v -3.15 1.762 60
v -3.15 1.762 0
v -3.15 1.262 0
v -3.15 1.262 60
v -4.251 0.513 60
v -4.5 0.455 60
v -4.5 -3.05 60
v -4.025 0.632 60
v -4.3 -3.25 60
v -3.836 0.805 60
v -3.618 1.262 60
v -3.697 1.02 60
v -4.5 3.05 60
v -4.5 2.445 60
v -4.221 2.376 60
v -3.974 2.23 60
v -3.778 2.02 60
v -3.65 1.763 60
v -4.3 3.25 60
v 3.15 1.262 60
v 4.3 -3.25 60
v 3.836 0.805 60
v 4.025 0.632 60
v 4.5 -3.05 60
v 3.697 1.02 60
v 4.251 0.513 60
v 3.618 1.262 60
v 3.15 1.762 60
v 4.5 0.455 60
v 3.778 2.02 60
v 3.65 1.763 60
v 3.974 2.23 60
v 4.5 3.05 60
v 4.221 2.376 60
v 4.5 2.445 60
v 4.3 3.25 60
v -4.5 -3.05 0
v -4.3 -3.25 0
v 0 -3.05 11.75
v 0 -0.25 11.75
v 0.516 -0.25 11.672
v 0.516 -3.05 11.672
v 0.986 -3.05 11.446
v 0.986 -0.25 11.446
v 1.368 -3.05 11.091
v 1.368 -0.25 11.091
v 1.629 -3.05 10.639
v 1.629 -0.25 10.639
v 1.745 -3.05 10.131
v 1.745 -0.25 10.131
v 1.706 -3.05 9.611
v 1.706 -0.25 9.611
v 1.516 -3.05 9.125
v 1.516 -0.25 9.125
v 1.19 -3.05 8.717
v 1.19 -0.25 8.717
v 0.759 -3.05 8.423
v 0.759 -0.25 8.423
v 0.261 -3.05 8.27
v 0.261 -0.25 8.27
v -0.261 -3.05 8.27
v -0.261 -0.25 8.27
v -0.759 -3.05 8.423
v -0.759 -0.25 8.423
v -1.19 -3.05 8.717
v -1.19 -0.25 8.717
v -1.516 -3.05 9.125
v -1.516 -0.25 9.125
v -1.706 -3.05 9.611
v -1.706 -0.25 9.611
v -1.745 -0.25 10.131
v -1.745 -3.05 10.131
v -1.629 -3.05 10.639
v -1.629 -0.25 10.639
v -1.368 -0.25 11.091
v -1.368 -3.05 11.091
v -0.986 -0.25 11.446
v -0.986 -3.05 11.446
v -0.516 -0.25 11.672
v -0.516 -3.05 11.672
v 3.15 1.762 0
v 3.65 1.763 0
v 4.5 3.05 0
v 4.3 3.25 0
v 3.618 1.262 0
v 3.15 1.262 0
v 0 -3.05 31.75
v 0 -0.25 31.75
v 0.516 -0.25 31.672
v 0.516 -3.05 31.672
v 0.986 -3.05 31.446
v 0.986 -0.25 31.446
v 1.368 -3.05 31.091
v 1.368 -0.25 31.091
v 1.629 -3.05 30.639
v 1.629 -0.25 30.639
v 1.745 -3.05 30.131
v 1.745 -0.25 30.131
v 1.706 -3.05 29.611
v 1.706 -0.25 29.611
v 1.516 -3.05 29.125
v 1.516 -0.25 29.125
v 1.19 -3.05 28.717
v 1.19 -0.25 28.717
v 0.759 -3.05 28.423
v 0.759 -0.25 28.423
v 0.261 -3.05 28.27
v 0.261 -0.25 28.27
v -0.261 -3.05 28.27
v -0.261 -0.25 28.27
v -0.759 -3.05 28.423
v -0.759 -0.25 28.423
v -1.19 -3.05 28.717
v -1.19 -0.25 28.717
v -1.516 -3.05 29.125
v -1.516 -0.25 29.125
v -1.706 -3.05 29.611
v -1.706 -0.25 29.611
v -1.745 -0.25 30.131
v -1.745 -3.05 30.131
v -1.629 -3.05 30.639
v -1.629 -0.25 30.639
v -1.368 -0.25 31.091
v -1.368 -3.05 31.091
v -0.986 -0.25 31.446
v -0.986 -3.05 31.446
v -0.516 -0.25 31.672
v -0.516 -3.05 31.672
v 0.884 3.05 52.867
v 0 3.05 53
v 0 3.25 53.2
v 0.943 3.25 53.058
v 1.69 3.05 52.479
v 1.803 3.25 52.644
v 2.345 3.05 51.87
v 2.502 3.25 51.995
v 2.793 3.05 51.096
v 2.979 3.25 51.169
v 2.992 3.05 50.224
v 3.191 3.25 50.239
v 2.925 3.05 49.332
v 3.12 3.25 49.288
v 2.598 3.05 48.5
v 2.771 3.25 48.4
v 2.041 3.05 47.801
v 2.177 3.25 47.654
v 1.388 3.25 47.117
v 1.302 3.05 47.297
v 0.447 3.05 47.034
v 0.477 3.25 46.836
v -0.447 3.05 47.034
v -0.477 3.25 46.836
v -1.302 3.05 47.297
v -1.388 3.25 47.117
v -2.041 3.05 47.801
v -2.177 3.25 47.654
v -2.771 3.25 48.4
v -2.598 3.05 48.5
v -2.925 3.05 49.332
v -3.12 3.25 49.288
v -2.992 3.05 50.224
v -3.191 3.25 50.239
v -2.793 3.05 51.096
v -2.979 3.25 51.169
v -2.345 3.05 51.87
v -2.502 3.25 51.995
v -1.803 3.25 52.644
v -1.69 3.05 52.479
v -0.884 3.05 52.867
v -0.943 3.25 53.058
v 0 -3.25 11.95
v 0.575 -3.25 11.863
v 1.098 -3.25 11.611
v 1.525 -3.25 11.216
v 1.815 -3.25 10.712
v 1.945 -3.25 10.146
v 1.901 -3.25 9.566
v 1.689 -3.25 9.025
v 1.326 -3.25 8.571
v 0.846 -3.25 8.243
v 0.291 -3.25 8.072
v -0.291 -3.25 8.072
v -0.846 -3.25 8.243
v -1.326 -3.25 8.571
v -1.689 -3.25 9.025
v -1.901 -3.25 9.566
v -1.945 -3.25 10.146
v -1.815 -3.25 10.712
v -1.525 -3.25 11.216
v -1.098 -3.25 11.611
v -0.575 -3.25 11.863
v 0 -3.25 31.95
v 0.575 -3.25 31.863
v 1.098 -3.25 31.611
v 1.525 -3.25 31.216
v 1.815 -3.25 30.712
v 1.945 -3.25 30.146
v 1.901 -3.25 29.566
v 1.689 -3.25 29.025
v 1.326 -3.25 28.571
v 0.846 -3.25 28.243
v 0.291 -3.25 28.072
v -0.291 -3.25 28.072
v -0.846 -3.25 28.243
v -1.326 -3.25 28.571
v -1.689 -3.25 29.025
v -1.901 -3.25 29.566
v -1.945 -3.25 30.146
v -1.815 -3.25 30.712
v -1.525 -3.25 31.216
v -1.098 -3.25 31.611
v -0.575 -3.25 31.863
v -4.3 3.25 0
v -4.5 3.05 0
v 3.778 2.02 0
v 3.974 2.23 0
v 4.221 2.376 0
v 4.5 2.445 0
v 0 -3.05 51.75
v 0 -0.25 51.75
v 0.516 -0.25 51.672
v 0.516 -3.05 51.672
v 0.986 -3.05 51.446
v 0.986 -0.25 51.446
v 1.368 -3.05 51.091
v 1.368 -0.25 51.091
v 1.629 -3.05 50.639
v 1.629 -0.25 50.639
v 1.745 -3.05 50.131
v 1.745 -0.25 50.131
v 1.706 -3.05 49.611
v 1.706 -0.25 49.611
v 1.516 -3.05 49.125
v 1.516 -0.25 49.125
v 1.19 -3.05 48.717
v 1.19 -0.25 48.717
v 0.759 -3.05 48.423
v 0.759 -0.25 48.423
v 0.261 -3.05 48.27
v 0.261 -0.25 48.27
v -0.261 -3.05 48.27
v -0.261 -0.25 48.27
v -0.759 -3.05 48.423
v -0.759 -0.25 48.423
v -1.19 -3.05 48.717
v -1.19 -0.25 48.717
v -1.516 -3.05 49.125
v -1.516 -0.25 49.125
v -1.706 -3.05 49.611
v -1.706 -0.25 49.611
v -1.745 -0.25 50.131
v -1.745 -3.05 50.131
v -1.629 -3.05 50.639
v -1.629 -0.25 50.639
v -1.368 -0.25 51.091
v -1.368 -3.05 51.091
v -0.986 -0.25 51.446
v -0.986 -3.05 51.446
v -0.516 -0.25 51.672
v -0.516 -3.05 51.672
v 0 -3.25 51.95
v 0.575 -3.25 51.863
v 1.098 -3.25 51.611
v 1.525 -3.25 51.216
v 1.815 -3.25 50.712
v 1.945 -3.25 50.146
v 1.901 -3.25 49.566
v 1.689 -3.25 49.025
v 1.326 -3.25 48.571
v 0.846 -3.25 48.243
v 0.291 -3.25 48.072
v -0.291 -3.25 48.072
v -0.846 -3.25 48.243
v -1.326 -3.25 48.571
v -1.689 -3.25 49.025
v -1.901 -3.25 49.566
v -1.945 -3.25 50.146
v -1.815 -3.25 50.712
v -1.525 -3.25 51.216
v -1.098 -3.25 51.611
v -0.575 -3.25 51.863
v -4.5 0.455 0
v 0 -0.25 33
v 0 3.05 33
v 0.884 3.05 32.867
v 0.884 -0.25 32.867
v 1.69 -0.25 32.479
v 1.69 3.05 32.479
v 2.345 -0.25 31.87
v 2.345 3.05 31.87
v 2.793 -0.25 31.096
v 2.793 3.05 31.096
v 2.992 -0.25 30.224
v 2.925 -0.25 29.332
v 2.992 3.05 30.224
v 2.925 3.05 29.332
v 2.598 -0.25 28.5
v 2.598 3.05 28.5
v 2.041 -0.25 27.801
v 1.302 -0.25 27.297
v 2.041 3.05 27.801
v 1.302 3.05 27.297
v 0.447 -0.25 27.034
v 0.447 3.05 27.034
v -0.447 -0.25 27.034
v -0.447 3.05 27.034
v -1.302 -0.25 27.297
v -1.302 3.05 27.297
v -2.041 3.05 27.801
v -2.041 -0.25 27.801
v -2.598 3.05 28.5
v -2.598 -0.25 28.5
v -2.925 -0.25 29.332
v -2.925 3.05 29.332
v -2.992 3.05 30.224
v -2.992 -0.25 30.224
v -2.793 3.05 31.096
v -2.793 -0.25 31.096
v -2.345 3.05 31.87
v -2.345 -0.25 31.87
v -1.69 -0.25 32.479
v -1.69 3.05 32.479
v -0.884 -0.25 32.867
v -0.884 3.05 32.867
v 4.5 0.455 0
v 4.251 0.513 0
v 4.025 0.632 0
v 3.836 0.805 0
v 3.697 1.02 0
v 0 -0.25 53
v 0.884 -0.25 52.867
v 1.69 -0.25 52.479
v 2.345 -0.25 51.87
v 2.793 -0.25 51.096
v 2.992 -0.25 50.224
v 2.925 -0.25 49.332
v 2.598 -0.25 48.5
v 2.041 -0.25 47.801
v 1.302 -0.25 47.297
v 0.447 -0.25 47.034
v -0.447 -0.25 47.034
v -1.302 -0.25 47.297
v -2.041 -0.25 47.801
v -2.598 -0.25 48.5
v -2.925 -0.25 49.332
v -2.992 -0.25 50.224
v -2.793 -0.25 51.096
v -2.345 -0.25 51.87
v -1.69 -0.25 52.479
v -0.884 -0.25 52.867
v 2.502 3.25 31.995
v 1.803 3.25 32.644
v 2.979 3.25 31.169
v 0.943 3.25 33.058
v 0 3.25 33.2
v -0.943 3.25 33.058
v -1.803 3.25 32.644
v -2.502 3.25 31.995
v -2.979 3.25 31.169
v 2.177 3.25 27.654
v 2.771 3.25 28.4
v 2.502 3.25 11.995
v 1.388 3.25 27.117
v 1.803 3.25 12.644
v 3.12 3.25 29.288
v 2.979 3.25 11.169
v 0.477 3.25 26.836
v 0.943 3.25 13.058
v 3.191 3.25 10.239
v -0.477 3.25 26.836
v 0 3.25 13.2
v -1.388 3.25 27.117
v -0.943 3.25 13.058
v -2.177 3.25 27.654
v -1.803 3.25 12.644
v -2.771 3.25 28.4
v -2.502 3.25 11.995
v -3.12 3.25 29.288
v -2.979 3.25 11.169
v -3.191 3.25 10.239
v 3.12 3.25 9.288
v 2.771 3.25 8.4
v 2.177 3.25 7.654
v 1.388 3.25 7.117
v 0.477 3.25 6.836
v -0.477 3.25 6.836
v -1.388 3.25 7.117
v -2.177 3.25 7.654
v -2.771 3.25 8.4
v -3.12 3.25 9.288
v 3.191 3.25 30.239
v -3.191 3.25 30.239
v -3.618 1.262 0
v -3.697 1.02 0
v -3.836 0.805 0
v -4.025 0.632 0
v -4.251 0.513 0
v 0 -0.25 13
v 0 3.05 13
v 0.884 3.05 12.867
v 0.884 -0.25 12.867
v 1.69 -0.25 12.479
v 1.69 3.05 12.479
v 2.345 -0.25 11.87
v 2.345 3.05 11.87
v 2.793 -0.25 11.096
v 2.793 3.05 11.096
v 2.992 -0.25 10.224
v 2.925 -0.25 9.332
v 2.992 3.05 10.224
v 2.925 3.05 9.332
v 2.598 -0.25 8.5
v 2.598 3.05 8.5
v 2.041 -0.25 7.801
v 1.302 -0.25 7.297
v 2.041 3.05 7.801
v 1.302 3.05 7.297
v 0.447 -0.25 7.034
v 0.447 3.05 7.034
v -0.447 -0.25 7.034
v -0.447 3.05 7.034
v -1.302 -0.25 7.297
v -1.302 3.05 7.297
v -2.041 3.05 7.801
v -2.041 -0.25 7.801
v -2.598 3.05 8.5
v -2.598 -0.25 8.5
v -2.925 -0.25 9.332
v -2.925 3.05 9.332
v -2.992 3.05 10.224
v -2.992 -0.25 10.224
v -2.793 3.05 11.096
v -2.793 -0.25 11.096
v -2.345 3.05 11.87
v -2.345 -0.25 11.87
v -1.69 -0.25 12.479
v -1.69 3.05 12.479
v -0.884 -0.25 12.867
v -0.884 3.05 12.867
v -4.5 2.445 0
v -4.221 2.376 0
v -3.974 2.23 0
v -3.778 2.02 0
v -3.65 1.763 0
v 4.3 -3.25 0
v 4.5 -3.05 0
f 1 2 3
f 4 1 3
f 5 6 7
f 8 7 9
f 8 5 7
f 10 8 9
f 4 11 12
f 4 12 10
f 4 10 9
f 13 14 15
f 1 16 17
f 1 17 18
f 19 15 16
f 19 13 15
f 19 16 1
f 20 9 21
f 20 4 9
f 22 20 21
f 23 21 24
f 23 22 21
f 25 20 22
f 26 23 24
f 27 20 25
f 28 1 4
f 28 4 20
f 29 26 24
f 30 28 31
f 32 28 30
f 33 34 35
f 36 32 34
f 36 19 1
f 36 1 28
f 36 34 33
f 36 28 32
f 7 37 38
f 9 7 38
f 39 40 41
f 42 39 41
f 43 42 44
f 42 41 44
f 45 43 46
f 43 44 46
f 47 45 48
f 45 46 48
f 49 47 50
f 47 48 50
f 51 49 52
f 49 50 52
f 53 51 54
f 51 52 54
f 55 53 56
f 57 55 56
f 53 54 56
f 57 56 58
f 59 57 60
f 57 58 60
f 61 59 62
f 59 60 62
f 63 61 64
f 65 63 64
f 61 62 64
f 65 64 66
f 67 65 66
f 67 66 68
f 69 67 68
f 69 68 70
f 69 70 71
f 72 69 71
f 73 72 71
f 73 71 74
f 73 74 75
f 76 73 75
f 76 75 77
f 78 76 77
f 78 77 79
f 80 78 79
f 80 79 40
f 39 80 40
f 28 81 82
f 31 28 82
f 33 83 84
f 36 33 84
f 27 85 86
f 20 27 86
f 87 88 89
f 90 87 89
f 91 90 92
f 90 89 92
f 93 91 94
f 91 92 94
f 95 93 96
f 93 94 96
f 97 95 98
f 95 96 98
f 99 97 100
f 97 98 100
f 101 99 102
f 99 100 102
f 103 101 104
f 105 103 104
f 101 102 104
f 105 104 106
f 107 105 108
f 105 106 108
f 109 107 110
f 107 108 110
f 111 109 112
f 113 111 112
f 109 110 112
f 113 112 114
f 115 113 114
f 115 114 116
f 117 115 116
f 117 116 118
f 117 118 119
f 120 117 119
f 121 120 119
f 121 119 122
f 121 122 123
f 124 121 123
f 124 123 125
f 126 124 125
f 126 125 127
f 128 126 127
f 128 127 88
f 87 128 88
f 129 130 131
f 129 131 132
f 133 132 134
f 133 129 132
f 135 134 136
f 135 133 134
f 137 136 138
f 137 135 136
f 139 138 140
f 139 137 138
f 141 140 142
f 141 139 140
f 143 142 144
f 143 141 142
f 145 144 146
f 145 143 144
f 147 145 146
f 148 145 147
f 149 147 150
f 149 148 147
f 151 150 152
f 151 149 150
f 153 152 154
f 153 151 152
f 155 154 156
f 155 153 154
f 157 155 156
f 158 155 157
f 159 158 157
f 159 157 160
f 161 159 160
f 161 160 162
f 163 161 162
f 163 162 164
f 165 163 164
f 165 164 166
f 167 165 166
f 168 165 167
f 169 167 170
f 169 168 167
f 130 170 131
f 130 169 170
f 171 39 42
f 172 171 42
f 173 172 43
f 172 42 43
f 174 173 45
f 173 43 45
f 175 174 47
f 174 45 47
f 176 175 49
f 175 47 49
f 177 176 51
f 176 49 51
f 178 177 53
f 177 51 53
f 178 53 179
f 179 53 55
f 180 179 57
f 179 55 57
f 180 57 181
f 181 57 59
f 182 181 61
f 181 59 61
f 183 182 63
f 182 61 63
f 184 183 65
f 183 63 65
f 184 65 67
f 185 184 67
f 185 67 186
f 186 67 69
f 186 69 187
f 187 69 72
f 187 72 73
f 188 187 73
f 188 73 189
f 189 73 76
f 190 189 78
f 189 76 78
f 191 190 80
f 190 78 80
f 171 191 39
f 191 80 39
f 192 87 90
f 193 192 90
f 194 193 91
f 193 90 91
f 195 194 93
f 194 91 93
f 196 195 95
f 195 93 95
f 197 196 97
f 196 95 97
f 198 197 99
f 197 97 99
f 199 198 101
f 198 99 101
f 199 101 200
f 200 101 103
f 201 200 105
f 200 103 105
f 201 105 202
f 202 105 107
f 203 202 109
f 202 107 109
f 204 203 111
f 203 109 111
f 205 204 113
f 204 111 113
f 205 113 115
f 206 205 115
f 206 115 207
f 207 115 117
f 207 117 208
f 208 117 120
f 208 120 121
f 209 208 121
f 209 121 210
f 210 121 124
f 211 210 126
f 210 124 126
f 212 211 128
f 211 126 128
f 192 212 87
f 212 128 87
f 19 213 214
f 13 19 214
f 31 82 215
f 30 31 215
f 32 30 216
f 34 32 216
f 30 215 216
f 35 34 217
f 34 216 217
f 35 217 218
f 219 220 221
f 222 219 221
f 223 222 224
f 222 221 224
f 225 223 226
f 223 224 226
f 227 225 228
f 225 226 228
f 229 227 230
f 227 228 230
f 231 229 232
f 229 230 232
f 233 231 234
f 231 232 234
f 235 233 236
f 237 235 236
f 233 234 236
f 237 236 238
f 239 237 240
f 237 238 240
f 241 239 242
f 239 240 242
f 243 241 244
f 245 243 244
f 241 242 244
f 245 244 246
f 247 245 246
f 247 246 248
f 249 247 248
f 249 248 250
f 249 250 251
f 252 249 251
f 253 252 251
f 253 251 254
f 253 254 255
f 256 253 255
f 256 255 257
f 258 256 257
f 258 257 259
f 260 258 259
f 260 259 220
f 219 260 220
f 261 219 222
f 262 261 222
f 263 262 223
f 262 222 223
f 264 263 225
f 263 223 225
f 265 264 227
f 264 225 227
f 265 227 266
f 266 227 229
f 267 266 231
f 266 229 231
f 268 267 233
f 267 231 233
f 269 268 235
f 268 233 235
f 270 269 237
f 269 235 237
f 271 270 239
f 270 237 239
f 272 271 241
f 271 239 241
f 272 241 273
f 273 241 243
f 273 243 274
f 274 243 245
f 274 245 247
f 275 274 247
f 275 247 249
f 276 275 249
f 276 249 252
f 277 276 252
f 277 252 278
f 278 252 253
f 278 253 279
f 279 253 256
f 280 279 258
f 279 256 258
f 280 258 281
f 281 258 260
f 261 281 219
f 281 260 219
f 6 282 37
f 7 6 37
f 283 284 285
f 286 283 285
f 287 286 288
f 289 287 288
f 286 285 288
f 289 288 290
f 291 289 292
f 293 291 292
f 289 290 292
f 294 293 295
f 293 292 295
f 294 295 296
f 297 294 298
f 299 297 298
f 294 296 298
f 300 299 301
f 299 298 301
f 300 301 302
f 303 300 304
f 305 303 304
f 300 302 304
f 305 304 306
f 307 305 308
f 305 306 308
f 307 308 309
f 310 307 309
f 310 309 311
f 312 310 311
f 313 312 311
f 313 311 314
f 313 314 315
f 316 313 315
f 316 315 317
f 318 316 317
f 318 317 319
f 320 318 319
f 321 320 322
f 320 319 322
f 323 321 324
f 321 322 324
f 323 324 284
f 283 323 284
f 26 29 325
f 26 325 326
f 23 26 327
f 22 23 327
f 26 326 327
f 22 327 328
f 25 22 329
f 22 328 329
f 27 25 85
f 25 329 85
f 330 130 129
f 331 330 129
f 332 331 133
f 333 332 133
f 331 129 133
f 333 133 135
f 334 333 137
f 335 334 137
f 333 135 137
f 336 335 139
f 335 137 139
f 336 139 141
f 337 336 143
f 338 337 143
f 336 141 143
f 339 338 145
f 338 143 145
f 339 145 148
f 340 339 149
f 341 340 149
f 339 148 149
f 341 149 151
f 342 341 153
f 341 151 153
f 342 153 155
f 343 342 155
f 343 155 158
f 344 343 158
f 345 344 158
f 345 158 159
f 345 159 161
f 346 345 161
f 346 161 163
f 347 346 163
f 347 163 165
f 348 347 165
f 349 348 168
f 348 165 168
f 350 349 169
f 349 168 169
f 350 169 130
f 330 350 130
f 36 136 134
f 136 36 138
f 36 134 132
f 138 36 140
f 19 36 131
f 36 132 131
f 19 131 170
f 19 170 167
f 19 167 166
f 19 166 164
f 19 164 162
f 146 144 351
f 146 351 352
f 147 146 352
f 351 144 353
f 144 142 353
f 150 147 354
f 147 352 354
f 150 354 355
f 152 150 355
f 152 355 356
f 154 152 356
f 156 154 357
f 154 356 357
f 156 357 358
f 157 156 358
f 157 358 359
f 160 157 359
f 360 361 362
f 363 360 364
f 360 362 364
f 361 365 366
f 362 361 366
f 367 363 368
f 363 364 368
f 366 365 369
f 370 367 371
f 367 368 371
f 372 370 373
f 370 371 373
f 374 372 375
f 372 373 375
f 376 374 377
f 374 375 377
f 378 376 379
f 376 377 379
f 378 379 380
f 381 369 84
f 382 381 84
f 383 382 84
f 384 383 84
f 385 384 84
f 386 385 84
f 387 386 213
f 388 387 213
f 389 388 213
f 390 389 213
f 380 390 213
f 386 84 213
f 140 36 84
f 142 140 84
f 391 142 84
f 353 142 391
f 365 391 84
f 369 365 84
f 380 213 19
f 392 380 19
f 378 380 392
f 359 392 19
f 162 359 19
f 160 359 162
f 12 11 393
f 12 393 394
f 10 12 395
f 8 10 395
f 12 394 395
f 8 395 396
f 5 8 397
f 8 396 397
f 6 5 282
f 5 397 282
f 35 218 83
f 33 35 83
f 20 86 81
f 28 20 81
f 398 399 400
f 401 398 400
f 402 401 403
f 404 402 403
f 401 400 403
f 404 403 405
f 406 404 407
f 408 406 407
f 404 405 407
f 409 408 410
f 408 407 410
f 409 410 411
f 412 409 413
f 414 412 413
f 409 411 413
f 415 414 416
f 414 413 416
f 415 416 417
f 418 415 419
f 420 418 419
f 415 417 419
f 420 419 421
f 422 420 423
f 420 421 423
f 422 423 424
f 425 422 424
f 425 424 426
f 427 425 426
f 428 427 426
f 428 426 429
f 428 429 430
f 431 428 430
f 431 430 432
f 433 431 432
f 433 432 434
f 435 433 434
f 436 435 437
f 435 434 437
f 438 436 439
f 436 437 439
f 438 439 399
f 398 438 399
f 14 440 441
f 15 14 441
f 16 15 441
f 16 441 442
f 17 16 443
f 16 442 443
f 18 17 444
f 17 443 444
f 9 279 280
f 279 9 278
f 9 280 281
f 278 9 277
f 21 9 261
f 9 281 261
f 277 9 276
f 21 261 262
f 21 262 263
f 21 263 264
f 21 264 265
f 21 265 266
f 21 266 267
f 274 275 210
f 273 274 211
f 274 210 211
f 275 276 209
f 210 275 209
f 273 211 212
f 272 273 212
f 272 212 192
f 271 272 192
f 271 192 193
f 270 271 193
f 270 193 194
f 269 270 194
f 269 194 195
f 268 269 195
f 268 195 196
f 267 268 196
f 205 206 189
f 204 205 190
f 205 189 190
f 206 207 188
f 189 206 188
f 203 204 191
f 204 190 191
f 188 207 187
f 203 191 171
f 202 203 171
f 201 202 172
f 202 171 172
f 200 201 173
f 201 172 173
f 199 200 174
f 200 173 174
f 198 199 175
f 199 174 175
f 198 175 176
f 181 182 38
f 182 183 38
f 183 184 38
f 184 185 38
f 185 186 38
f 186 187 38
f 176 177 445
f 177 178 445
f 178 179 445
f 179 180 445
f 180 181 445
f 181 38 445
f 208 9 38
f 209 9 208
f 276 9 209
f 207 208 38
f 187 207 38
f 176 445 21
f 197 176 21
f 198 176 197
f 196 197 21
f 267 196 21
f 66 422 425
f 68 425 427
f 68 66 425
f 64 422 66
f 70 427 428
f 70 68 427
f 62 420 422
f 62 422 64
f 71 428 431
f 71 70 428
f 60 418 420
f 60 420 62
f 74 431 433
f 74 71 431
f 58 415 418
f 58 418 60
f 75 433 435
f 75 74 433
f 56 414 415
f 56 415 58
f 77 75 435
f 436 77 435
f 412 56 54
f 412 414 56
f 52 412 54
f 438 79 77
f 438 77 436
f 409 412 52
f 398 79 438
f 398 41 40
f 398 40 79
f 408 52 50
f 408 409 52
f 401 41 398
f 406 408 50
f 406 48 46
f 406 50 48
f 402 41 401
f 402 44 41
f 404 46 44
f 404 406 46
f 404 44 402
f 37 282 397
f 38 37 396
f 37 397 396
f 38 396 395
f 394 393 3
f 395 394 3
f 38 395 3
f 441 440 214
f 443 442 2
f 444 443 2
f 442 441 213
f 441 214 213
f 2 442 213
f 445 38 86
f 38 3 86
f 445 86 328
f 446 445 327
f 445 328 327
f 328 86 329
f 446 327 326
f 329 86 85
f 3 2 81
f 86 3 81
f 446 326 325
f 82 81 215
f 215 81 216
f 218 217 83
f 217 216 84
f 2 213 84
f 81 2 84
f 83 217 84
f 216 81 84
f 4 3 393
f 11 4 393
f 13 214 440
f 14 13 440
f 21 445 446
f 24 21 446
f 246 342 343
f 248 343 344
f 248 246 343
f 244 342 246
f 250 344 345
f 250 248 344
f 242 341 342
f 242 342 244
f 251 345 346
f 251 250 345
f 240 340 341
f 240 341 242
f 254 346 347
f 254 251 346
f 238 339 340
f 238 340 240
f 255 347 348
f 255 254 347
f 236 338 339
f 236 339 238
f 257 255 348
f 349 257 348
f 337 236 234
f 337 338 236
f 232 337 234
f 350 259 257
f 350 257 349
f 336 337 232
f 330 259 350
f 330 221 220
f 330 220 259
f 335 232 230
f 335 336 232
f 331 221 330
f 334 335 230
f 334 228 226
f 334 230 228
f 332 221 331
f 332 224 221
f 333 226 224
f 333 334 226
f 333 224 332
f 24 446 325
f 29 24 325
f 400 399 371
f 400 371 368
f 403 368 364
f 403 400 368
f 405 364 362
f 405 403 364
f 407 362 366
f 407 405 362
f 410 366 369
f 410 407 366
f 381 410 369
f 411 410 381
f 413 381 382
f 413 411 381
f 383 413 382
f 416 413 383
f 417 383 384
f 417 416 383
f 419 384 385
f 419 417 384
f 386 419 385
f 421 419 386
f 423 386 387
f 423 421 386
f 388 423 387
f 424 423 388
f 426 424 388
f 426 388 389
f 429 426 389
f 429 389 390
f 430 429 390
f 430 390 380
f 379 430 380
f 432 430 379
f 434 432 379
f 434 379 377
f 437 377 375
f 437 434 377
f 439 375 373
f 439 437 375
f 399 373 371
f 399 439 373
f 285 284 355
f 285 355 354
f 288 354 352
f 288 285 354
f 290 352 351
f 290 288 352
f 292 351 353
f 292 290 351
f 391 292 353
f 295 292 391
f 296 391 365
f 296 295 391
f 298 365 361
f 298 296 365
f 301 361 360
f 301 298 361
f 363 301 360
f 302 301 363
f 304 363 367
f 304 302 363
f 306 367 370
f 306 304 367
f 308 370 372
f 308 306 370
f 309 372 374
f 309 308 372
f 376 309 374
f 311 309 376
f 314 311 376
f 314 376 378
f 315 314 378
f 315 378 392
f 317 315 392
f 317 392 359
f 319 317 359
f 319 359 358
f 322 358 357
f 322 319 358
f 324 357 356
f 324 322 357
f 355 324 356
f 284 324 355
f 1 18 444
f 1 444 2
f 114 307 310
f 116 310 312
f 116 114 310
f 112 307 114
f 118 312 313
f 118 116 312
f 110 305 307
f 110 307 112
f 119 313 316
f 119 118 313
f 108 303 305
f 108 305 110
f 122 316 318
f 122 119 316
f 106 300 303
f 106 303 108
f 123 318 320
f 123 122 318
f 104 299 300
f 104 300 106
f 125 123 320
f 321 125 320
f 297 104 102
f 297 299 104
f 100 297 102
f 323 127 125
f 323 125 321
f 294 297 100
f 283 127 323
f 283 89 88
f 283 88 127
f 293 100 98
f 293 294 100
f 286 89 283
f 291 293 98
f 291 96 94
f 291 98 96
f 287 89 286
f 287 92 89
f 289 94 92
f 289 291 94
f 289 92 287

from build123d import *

# Parameters (mm, degrees)
EXTRUDE1_DEPTH             = 60
EXTRUDE2_REACH             = 62.519
SKETCH2_R                  = 1.75
SKETCH_R                   = 3
SKETCH_R_2                 = 1.75
EXTRUDE4_DEPTH             = 3.5
CHAMFER1_SIZE              = 0.2
LPATTERN1_COUNT            = 3
LPATTERN1_PITCH            = 20
CHAMFER1_OF_LPATTERN1_SIZE = 0.2


with BuildPart() as part:
    # Sketch1 → Extrude1 (new body)
    with BuildSketch(Plane.XY):
        with BuildLine():
            Line((-4.3, -3.25), (4.3, -3.25))
            Line((4.3, -3.25), (4.5, -3.05))
            Line((4.5, -3.05), (4.5, 0.455012563))
            ThreePointArc((4.5, 0.455012563), (3.924845827, 0.712323349), (3.617735397, 1.2625))
            Line((3.617735397, 1.2625), (3.15008224, 1.2625))
            Line((3.15008224, 1.2625), (3.15008224, 1.7625))
            Line((3.15008224, 1.7625), (3.65008224, 1.7625))
            ThreePointArc((3.65008224, 1.7625), (3.973877727, 2.229724887), (4.5, 2.444987437))
            Line((4.5, 2.444987437), (4.5, 3.05))
            Line((4.5, 3.05), (4.3, 3.25))
            Line((4.3, 3.25), (-4.3, 3.25))
            Line((-4.3, 3.25), (-4.5, 3.05))
            Line((-4.5, 3.05), (-4.5, 2.444987437))
            ThreePointArc((-4.5, 2.444987437), (-3.973877727, 2.229724887), (-3.65008224, 1.7625))
            Line((-3.65008224, 1.7625), (-3.15008224, 1.7625))
            Line((-3.15008224, 1.7625), (-3.15008224, 1.2625))
            Line((-3.15008224, 1.2625), (-3.617735397, 1.2625))
            ThreePointArc((-3.617735397, 1.2625), (-3.924845827, 0.712323349), (-4.5, 0.455012563))
            Line((-4.5, 0.455012563), (-4.5, -3.05))
            Line((-4.5, -3.05), (-4.3, -3.25))
        make_face()
    extrude(amount=EXTRUDE1_DEPTH)

    # Sketch2 → Extrude2 (cut, up to next)
    with BuildSketch(Plane(origin=(0, 3.25, 0), x_dir=(1, 0, 0), z_dir=(0, 1, 0)), mode=Mode.PRIVATE) as extrude2_sk1:
        with Locations((0, -10)):
            Circle(SKETCH2_R)
    extrude2_tool1 = extrude(extrude2_sk1.sketch, amount=-EXTRUDE2_REACH, mode=Mode.PRIVATE) & part.part
    extrude2 = extrude2_tool1.solids().sort_by_distance((0, 3.25, 10))[0]
    add(extrude2, mode=Mode.SUBTRACT)

    # Sketch → Extrude4 (cut)
    with BuildSketch(Plane(origin=(0, 3.25, 0), x_dir=(1, 0, 0), z_dir=(0, 1, 0))):
        with Locations((0, -10)):
            Circle(SKETCH_R)
        with Locations((0, -10)):
            Circle(SKETCH_R_2, mode=Mode.SUBTRACT)
    extrude4 = extrude(amount=-EXTRUDE4_DEPTH, mode=Mode.SUBTRACT)

    # Chamfer1
    chamfer1_edges = [part.edges().sort_by_distance(p)[0] for p in [
        (-1.75, -3.25, 10),
        (-3, 3.25, 10),
    ]]
    chamfer(chamfer1_edges, length=CHAMFER1_SIZE)

    # LPattern1: Extrude2, Extrude4 ×3
    with Locations(*[(0, 0, i * LPATTERN1_PITCH) for i in range(1, LPATTERN1_COUNT)]):
        add(extrude2, mode=Mode.SUBTRACT)
        add(extrude4, mode=Mode.SUBTRACT)

    # Chamfer1 of LPattern1
    chamfer1_of_lpattern1_edges = [part.edges().sort_by_distance(p)[0] for p in [
        (-1.75, -3.25, 30),
        (-3, 3.25, 30),
        (-1.75, -3.25, 50),
        (-3, 3.25, 50),
    ]]
    chamfer(chamfer1_of_lpattern1_edges, length=CHAMFER1_OF_LPATTERN1_SIZE)


solid = part.part
